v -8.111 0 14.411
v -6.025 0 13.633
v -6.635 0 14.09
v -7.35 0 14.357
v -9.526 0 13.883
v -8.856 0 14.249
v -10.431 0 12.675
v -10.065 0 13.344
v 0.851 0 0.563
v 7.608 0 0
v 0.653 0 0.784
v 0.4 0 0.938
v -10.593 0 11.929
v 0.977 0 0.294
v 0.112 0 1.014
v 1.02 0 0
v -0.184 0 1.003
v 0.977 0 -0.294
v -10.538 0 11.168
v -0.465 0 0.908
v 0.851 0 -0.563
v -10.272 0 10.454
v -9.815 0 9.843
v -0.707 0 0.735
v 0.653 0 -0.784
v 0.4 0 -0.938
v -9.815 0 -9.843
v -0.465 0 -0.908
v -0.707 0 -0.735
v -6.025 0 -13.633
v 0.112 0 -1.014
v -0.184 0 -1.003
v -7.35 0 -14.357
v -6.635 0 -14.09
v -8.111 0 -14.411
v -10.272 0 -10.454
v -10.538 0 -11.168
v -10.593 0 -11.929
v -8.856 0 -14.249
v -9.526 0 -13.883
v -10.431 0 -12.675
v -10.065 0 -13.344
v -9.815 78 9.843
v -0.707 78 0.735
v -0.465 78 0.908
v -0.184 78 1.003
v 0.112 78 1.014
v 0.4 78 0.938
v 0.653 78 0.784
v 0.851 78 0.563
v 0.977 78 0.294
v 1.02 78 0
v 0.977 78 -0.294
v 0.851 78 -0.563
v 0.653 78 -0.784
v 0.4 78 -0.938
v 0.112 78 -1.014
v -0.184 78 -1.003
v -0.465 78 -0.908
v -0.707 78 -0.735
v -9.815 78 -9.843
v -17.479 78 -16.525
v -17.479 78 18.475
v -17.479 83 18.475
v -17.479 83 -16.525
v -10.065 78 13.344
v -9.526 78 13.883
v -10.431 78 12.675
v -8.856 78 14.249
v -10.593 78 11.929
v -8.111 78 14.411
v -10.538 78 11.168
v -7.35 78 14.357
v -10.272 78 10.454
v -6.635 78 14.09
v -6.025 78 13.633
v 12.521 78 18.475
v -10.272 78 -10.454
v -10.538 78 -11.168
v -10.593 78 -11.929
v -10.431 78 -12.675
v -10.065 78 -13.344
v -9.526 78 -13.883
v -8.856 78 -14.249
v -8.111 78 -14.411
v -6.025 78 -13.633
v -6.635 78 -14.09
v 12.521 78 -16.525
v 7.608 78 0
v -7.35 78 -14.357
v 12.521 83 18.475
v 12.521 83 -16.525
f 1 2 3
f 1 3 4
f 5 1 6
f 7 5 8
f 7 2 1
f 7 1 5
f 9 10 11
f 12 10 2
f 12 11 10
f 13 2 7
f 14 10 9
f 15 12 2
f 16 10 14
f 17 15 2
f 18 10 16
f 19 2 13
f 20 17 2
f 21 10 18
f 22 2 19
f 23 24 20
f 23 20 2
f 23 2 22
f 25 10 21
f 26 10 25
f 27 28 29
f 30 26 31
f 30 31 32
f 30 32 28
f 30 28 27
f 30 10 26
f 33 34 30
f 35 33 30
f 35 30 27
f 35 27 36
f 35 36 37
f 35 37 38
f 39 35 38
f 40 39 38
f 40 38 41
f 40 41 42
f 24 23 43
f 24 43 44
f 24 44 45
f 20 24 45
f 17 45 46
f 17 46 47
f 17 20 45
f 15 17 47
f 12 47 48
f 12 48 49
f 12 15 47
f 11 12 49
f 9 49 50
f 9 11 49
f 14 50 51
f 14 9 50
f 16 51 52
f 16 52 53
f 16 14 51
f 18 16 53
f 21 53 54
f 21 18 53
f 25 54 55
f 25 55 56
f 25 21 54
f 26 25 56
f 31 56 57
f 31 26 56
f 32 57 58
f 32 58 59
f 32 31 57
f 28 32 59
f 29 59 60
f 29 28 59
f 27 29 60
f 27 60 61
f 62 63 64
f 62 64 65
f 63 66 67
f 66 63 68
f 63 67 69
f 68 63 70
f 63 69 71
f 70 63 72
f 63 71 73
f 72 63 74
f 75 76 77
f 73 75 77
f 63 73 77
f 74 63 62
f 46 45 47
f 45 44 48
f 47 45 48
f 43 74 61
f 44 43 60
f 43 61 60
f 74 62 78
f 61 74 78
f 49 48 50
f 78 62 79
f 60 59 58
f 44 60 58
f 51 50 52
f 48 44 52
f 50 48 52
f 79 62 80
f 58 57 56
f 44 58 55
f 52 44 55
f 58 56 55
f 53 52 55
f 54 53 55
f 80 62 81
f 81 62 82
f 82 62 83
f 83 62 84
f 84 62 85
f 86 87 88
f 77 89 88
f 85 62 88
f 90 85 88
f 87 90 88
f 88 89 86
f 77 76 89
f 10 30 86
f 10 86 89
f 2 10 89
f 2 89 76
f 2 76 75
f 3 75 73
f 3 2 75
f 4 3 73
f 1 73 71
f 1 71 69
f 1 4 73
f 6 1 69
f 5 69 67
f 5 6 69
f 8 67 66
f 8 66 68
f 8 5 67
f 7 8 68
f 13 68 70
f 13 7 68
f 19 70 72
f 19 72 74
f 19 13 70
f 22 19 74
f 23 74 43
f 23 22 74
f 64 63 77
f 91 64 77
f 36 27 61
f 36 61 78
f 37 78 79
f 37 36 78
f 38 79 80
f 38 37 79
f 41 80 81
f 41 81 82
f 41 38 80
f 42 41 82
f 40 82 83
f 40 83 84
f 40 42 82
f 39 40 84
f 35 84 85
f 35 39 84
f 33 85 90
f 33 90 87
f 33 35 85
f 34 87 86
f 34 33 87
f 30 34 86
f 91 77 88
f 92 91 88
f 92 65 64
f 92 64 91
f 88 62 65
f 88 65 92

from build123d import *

# Parameters (mm, degrees)
BOSS_EXTRUDE1_DEPTH = 78
SKETCH2_W           = 30
SKETCH2_H           = 35
BOSS_EXTRUDE2_DEPTH = 5


with BuildPart() as part:
    # Sketch1 → Boss-Extrude1 (new body)
    with BuildSketch(Plane(origin=(0, 0, 0), x_dir=(1, 0, 0), z_dir=(0, 1, 0))):
        with BuildLine():
            Line((-6.024549776, 13.633018741), (7.608468966, 0))
            Line((7.608468966, 0), (-6.024549776, -13.633018741))
            ThreePointArc((-6.024549776, -13.633018741), (-9.814642123, -13.633018741), (-9.814642123, -9.842926394))
            Line((-9.814642123, -9.842926394), (-0.706968119, -0.735252391))
            ThreePointArc((-0.706968119, -0.735252391), (1.02, 0), (-0.706968119, 0.735252391))
            Line((-0.706968119, 0.735252391), (-9.814642123, 9.842926394))
            ThreePointArc((-9.814642123, 9.842926394), (-9.814642123, 13.633018741), (-6.024549776, 13.633018741))
        make_face()
    extrude(amount=BOSS_EXTRUDE1_DEPTH)

    # Sketch2 → Boss-Extrude2 (add)
    with BuildSketch(Plane(origin=(0, 78, 0), x_dir=(1, 0, 0), z_dir=(0, 1, 0))):
        with Locations((-2.479307664, -0.975058093)):
            Rectangle(SKETCH2_W, SKETCH2_H)
    extrude(amount=BOSS_EXTRUDE2_DEPTH)


solid = part.part
